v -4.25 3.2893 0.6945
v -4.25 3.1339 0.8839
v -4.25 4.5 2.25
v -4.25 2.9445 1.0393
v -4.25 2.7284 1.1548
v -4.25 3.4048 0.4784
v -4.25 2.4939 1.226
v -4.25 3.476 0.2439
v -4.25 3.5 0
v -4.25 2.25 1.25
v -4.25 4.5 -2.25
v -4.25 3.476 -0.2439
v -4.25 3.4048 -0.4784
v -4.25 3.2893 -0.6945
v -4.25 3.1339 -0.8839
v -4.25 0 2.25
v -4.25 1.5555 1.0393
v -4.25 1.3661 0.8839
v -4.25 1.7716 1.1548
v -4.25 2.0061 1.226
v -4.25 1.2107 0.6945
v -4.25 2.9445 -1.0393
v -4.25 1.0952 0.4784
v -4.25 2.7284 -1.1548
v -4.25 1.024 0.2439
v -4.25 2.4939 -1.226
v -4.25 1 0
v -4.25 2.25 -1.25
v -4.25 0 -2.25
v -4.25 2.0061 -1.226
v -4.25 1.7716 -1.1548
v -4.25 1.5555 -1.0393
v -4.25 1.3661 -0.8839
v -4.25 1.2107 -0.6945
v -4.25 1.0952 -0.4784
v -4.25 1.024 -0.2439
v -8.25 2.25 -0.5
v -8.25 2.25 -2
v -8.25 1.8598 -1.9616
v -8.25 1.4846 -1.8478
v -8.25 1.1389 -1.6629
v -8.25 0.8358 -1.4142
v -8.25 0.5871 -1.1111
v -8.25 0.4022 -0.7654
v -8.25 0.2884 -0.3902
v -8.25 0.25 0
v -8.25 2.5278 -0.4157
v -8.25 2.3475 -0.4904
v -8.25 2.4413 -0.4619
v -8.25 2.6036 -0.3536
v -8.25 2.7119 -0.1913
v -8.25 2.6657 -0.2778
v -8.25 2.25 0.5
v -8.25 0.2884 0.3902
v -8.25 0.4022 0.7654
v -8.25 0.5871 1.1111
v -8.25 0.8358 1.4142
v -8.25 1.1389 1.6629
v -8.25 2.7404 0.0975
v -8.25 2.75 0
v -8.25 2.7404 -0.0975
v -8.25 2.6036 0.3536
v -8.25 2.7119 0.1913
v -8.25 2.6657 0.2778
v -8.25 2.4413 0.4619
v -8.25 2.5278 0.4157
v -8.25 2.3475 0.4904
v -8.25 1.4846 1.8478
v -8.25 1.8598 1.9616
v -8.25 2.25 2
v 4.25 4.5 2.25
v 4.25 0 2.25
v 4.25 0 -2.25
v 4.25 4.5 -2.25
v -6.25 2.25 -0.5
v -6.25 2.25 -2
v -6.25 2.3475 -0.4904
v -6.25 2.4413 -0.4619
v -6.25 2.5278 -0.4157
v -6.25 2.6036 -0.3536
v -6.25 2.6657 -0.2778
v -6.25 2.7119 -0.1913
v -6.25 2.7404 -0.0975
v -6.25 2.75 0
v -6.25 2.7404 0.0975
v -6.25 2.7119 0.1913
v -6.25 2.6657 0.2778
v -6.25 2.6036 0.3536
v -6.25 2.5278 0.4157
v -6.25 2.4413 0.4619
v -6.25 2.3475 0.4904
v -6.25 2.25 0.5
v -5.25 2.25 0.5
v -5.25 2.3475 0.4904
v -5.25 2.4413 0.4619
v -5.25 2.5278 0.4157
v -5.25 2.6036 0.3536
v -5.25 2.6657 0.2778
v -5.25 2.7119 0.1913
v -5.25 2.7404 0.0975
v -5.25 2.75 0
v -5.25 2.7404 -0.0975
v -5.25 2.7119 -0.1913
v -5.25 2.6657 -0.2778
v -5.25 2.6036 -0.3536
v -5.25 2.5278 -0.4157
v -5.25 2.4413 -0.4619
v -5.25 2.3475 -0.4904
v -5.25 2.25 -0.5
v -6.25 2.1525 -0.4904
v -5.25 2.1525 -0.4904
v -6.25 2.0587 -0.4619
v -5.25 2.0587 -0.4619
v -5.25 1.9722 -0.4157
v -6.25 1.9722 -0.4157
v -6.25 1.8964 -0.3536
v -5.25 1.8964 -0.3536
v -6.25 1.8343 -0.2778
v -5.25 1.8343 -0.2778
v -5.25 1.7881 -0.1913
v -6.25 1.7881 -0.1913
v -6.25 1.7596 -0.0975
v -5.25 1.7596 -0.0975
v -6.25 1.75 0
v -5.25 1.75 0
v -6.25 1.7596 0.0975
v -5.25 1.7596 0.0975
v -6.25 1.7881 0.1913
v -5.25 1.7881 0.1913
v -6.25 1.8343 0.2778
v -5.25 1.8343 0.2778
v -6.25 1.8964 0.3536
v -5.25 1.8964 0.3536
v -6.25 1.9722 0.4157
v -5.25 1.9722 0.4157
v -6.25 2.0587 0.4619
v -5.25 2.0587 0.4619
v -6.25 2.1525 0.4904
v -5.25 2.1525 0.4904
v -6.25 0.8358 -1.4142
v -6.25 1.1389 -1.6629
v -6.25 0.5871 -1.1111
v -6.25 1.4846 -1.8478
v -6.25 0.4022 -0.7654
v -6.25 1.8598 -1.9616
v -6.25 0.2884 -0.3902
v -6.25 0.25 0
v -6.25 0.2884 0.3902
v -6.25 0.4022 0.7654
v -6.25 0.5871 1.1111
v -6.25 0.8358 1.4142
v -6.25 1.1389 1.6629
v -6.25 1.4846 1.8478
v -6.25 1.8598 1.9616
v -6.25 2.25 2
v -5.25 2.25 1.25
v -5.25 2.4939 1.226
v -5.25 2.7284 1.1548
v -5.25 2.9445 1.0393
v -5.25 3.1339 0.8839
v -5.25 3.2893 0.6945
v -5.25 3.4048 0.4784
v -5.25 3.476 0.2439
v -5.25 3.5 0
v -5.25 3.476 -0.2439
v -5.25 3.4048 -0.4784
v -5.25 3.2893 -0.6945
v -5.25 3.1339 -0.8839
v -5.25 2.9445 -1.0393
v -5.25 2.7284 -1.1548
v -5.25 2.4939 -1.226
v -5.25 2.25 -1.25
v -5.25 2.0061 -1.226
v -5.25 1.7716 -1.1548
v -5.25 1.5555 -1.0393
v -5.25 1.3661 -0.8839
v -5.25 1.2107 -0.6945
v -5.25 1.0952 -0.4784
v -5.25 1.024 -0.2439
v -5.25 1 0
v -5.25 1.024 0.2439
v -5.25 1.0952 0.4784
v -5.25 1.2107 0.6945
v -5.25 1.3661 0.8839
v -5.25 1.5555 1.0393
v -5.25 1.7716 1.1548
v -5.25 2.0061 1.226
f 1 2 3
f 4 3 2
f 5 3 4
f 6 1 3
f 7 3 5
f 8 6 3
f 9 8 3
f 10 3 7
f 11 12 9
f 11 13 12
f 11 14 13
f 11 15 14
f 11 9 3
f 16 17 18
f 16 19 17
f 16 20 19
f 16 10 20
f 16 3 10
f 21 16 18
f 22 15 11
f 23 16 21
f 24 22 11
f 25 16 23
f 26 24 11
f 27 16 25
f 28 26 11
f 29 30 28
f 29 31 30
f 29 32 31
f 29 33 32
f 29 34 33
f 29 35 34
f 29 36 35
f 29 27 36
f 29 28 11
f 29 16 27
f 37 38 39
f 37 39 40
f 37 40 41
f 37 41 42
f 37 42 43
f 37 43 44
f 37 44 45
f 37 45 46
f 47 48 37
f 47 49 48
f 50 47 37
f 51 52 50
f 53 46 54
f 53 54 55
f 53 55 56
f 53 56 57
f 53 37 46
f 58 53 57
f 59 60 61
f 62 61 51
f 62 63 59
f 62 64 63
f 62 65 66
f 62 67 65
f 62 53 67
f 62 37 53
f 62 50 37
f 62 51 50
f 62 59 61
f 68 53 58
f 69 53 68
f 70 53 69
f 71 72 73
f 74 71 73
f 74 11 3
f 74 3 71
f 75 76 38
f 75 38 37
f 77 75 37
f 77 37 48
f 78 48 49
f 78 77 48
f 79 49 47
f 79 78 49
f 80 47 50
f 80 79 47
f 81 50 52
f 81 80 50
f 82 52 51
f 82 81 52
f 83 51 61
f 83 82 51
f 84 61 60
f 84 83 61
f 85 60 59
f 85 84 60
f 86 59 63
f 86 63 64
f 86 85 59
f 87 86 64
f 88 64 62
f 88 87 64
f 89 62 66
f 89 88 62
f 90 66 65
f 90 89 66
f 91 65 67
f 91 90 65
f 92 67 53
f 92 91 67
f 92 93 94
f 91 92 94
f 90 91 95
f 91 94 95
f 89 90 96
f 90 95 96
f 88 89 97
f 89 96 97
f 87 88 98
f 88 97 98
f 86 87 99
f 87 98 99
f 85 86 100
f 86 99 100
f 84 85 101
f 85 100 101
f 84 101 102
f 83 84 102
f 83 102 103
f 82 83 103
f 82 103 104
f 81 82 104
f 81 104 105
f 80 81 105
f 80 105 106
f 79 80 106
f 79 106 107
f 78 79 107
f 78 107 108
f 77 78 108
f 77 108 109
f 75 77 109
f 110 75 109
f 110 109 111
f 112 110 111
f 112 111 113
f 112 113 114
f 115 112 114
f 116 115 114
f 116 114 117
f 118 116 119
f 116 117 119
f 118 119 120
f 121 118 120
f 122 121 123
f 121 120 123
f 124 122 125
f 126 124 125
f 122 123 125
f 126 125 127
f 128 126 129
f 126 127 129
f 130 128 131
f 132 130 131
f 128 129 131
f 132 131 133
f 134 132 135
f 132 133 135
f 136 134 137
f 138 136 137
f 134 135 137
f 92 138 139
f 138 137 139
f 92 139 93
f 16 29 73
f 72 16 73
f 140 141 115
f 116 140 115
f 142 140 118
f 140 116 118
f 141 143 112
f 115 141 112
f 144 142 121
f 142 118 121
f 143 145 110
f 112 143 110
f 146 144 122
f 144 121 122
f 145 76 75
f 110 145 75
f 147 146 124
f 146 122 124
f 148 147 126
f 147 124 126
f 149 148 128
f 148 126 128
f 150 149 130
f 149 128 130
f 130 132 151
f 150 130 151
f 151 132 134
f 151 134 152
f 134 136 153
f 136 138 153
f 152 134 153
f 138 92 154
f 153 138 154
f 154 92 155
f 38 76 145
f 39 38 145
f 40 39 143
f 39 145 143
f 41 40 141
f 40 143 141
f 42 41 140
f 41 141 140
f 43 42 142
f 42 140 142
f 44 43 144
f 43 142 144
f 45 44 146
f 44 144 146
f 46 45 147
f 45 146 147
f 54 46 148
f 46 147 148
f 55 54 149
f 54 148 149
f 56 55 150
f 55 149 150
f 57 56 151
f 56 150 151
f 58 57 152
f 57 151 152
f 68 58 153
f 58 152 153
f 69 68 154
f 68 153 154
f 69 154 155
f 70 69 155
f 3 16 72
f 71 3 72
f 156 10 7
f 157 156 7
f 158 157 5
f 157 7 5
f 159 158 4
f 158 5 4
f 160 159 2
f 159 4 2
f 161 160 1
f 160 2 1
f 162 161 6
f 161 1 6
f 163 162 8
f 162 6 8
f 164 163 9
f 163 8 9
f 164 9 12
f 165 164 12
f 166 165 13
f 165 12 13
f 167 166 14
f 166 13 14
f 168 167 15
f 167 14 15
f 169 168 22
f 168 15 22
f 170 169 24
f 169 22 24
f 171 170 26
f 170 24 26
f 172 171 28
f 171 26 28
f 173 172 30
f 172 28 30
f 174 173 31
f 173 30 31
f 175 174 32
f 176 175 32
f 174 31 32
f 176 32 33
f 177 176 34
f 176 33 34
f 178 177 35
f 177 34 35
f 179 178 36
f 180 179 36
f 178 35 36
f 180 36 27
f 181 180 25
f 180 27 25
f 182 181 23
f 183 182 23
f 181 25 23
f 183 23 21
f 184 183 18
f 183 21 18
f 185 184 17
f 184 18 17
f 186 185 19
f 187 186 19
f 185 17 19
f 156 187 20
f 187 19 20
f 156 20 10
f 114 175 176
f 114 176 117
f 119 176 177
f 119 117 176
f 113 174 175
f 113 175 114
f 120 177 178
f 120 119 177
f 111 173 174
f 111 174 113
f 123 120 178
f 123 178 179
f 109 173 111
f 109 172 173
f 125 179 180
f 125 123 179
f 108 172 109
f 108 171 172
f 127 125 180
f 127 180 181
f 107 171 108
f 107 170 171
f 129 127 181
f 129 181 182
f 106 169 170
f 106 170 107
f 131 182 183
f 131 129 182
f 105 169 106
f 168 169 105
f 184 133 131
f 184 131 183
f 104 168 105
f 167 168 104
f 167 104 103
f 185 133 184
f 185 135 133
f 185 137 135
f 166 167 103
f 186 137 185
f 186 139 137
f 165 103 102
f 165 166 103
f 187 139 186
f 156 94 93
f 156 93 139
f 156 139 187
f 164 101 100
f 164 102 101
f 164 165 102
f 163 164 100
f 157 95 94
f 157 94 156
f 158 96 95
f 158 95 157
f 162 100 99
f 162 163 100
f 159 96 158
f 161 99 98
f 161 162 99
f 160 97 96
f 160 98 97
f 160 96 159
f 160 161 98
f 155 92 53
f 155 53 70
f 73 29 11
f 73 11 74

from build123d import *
from build123d.topology import SkipClean

# Parameters (mm, degrees)
SKETCH1_W           = 8.5
SKETCH1_H           = 4.5
BOSS_EXTRUDE1_DEPTH = 4.5
SKETCH2_R           = 1.25
BOSS_EXTRUDE2_DEPTH = 1
SKETCH3_R           = 0.5
BOSS_EXTRUDE3_DEPTH = 1
SKETCH4_R           = 2
BOSS_EXTRUDE4_DEPTH = 2
CUT_EXTRUDE1_START  = -2
CUT_EXTRUDE1_DEPTH  = 2


with BuildPart() as part:
    # Sketch1 → Boss-Extrude1 (new body)
    with BuildSketch(Plane(origin=(0, 0, 0), x_dir=(1, 0, 0), z_dir=(0, 1, 0))):
        Rectangle(SKETCH1_W, SKETCH1_H)
    extrude(amount=BOSS_EXTRUDE1_DEPTH)

    # Sketch2 → Boss-Extrude2 (add)
    with BuildSketch(Plane.ZY.offset(4.25)):
        with Locations((0, 2.25)):
            Circle(SKETCH2_R)
    extrude(amount=BOSS_EXTRUDE2_DEPTH)

    # Sketch3 → Boss-Extrude3 (add)
    with BuildSketch(Plane.ZY.offset(5.25)):
        with Locations((0, 2.25)):
            Circle(SKETCH3_R)
    extrude(amount=BOSS_EXTRUDE3_DEPTH)

    # Sketch4 → Boss-Extrude4 (add)
    with BuildSketch(Plane.ZY.offset(6.25)):
        with Locations((0, 2.25)):
            Circle(SKETCH4_R)
    extrude(amount=BOSS_EXTRUDE4_DEPTH)

    # Sketch5 → Cut-Extrude1 (cut)
    with SkipClean():  # the faces are left unmerged after this step: merging them gives an invalid solid
        with BuildSketch(Plane.ZY.offset(8.25).offset(CUT_EXTRUDE1_START)):
            with BuildLine():
                ThreePointArc((2, 2.25), (0, 4.25), (-2, 2.25))
                Line((-2, 2.25), (-0.5, 2.25))
                ThreePointArc((-0.5, 2.25), (0, 2.75), (0.5, 2.25))
                Line((0.5, 2.25), (2, 2.25))
            make_face()
        extrude(amount=CUT_EXTRUDE1_DEPTH, mode=Mode.SUBTRACT)


solid = part.part
